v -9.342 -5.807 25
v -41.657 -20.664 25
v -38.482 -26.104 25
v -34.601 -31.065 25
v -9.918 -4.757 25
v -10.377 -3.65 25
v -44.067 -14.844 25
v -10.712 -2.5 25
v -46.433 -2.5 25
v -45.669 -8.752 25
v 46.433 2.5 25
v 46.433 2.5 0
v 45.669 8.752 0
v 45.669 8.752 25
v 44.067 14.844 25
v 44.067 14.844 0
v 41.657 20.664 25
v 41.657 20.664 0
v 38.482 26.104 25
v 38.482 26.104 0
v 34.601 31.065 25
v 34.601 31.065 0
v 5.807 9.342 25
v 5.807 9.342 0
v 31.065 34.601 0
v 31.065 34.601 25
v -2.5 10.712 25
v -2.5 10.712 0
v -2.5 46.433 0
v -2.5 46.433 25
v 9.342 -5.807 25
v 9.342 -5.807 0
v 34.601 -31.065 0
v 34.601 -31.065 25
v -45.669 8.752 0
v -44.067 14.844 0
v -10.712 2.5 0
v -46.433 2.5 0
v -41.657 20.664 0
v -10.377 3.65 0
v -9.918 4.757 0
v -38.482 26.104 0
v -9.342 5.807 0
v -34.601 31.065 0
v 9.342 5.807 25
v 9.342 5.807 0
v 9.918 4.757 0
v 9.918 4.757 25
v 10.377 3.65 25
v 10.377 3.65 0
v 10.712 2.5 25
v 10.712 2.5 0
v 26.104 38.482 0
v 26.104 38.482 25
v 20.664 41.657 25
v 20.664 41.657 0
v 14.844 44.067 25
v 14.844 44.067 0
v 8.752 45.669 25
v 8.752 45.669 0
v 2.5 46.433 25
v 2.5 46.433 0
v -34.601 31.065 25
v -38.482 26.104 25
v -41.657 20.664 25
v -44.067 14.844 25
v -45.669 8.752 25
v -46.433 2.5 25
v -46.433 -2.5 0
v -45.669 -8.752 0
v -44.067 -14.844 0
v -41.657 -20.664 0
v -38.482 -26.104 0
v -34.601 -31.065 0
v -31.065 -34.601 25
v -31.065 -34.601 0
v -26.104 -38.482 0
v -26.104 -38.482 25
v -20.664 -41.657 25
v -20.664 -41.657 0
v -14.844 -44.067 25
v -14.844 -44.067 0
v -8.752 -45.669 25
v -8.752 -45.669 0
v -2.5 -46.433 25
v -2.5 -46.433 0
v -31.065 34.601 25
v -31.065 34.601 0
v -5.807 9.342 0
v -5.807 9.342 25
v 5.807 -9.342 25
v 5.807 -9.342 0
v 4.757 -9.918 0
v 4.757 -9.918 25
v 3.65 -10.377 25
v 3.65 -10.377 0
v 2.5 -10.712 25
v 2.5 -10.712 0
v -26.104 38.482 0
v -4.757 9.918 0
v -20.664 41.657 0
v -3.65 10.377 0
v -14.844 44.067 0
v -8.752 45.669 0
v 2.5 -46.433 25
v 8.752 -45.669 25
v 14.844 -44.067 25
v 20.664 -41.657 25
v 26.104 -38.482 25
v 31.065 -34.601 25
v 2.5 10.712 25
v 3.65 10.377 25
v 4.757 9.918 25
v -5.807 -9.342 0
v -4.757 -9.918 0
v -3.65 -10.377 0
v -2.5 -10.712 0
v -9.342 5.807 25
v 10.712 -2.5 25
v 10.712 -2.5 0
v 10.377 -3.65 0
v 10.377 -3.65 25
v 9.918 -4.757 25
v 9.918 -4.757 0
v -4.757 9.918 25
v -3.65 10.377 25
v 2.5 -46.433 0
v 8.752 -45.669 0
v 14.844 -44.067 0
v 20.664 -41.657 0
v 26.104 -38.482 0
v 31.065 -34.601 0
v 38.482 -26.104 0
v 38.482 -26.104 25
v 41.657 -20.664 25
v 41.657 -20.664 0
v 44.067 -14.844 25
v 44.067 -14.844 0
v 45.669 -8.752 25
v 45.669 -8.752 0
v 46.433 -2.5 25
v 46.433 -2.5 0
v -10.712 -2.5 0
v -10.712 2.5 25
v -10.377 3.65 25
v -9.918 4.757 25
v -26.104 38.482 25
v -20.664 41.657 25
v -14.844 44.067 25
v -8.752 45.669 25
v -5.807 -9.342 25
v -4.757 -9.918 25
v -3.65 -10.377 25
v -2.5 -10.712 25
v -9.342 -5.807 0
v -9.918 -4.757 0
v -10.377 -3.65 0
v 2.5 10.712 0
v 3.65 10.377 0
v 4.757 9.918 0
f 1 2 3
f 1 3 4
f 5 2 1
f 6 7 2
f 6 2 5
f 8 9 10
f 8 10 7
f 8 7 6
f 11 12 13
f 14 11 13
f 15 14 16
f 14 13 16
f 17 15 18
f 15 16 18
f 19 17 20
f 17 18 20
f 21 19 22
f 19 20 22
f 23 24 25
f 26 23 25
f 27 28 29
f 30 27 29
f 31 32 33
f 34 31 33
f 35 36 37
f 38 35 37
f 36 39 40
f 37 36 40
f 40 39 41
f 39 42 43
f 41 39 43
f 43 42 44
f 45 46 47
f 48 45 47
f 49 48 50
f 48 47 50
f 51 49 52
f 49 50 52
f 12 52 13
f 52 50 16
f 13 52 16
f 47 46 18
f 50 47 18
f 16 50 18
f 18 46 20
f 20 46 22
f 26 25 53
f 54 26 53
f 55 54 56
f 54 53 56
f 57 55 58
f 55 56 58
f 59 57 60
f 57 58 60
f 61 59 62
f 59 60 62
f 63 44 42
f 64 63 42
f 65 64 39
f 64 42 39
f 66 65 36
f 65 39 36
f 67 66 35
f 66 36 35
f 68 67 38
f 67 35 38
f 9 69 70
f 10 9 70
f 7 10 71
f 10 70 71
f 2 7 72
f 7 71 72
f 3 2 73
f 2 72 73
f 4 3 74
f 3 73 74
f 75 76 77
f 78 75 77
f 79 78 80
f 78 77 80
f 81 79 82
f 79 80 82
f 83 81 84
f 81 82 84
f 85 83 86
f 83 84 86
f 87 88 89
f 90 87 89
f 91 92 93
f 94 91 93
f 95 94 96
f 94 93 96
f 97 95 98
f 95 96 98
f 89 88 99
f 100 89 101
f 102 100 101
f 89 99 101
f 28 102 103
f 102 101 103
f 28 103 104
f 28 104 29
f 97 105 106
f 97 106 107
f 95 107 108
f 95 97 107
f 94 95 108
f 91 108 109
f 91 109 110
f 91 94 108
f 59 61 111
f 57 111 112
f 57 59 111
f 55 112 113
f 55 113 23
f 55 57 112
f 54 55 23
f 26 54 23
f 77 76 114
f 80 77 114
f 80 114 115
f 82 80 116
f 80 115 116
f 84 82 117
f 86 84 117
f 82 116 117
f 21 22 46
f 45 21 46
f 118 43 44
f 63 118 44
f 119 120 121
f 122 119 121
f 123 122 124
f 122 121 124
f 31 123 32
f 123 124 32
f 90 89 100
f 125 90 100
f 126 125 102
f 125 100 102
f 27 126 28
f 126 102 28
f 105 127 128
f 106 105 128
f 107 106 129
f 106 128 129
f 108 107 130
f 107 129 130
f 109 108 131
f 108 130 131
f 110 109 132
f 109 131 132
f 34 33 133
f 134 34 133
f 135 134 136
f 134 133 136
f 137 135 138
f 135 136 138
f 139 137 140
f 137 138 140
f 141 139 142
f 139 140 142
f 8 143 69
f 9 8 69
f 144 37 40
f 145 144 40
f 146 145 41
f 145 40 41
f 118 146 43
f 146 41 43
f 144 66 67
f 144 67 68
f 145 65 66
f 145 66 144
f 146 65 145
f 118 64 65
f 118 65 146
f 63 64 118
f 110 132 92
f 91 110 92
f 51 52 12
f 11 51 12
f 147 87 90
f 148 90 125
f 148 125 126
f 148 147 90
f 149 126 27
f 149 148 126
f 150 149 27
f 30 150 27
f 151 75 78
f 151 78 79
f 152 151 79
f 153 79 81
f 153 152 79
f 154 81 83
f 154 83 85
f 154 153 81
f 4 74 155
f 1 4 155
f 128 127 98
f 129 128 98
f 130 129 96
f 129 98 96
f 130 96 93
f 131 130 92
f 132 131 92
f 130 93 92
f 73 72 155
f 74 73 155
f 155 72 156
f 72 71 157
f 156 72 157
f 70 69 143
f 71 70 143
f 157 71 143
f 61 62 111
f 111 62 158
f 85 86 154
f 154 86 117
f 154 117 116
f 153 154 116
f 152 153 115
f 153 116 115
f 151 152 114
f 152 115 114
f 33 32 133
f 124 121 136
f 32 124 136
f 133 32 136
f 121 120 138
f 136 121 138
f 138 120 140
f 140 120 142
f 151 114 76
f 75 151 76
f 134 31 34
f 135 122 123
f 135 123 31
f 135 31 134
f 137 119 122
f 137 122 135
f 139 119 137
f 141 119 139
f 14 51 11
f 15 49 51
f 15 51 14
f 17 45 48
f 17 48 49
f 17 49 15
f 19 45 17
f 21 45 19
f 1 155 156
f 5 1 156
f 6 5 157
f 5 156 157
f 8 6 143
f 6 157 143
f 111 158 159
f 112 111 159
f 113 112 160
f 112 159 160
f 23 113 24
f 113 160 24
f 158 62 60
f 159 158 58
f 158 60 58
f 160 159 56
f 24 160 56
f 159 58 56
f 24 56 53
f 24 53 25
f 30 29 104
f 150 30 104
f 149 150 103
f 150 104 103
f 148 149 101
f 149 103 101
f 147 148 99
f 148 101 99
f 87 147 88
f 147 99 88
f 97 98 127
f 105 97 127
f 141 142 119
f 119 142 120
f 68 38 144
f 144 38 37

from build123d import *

# Parameters (mm, degrees)
F1_DEPTH = 25


with BuildPart() as f1:
    # F0 (on Top) → F1 (new body)
    with BuildSketch(Plane.XY):
        with BuildLine():
            Line((-9.3423956567, 5.8068617508), (-34.6006772717, 31.0651433658))
            ThreePointArc((-34.6006772717, 31.0651433658), (-42.9603982618, 17.794779605), (-46.432747065, 2.5))
            Line((-46.432747065, 2.5), (-10.7121426428, 2.5))
            ThreePointArc((-10.7121426428, 2.5), (-10.1626748576, 4.209517756), (-9.3423956567, 5.8068617508))
        make_face()
    extrude(amount=F1_DEPTH)


with BuildPart() as f1b:
    # F0 (on Top) → F1, piece 2 (new body)
    with BuildSketch(Plane.XY):
        with BuildLine():
            Line((-2.5, 10.7121426428), (-2.5, 46.432747065))
            ThreePointArc((-2.5, 46.432747065), (-17.794779605, 42.9603982618), (-31.0651433658, 34.6006772717))
            Line((-31.0651433658, 34.6006772717), (-5.8068617508, 9.3423956567))
            ThreePointArc((-5.8068617508, 9.3423956567), (-4.209517756, 10.1626748576), (-2.5, 10.7121426428))
        make_face()
    extrude(amount=F1_DEPTH)


with BuildPart() as f1c:
    # F0 (on Top) → F1, piece 3 (new body)
    with BuildSketch(Plane.XY):
        with BuildLine():
            Line((5.8068617508, 9.3423956567), (31.0651433658, 34.6006772717))
            ThreePointArc((31.0651433658, 34.6006772717), (17.794779605, 42.9603982618), (2.5, 46.432747065))
            Line((2.5, 46.432747065), (2.5, 10.7121426428))
            ThreePointArc((2.5, 10.7121426428), (4.209517756, 10.1626748576), (5.8068617508, 9.3423956567))
        make_face()
    extrude(amount=F1_DEPTH)


with BuildPart() as f1d:
    # F0 (on Top) → F1, piece 4 (new body)
    with BuildSketch(Plane.XY):
        with BuildLine():
            Line((10.7121426428, 2.5), (46.432747065, 2.5))
            ThreePointArc((46.432747065, 2.5), (42.9603982618, 17.794779605), (34.6006772717, 31.0651433658))
            Line((34.6006772717, 31.0651433658), (9.3423956567, 5.8068617508))
            ThreePointArc((9.3423956567, 5.8068617508), (10.1626748576, 4.209517756), (10.7121426428, 2.5))
        make_face()
    extrude(amount=F1_DEPTH)


with BuildPart() as f1e:
    # F0 (on Top) → F1, piece 5 (new body)
    with BuildSketch(Plane.XY):
        with BuildLine():
            ThreePointArc((34.6006772717, -31.0651433658), (42.9603982618, -17.794779605), (46.432747065, -2.5))
            Line((46.432747065, -2.5), (10.7121426428, -2.5))
            ThreePointArc((10.7121426428, -2.5), (10.1626748576, -4.209517756), (9.3423956567, -5.8068617508))
            Line((9.3423956567, -5.8068617508), (34.6006772717, -31.0651433658))
        make_face()
    extrude(amount=F1_DEPTH)


with BuildPart() as f1f:
    # F0 (on Top) → F1, piece 6 (new body)
    with BuildSketch(Plane.XY):
        with BuildLine():
            ThreePointArc((2.5, -46.432747065), (17.794779605, -42.9603982618), (31.0651433658, -34.6006772717))
            Line((31.0651433658, -34.6006772717), (5.8068617508, -9.3423956567))
            ThreePointArc((5.8068617508, -9.3423956567), (4.209517756, -10.1626748576), (2.5, -10.7121426428))
            Line((2.5, -10.7121426428), (2.5, -46.432747065))
        make_face()
    extrude(amount=F1_DEPTH)


with BuildPart() as f1g:
    # F0 (on Top) → F1, piece 7 (new body)
    with BuildSketch(Plane.XY):
        with BuildLine():
            ThreePointArc((-31.0651433658, -34.6006772717), (-17.794779605, -42.9603982618), (-2.5, -46.432747065))
            Line((-2.5, -46.432747065), (-2.5, -10.7121426428))
            ThreePointArc((-2.5, -10.7121426428), (-4.209517756, -10.1626748576), (-5.8068617508, -9.3423956567))
            Line((-5.8068617508, -9.3423956567), (-31.0651433658, -34.6006772717))
        make_face()
    extrude(amount=F1_DEPTH)


with BuildPart() as f1h:
    # F0 (on Top) → F1, piece 8 (new body)
    with BuildSketch(Plane.XY):
        with BuildLine():
            ThreePointArc((-46.432747065, -2.5), (-42.9603982618, -17.794779605), (-34.6006772717, -31.0651433658))
            Line((-34.6006772717, -31.0651433658), (-9.3423956567, -5.8068617508))
            ThreePointArc((-9.3423956567, -5.8068617508), (-10.1626748576, -4.209517756), (-10.7121426428, -2.5))
            Line((-10.7121426428, -2.5), (-46.432747065, -2.5))
        make_face()
    extrude(amount=F1_DEPTH)


solid = Compound([f1.part, f1b.part, f1c.part, f1d.part, f1e.part, f1f.part, f1g.part, f1h.part])
